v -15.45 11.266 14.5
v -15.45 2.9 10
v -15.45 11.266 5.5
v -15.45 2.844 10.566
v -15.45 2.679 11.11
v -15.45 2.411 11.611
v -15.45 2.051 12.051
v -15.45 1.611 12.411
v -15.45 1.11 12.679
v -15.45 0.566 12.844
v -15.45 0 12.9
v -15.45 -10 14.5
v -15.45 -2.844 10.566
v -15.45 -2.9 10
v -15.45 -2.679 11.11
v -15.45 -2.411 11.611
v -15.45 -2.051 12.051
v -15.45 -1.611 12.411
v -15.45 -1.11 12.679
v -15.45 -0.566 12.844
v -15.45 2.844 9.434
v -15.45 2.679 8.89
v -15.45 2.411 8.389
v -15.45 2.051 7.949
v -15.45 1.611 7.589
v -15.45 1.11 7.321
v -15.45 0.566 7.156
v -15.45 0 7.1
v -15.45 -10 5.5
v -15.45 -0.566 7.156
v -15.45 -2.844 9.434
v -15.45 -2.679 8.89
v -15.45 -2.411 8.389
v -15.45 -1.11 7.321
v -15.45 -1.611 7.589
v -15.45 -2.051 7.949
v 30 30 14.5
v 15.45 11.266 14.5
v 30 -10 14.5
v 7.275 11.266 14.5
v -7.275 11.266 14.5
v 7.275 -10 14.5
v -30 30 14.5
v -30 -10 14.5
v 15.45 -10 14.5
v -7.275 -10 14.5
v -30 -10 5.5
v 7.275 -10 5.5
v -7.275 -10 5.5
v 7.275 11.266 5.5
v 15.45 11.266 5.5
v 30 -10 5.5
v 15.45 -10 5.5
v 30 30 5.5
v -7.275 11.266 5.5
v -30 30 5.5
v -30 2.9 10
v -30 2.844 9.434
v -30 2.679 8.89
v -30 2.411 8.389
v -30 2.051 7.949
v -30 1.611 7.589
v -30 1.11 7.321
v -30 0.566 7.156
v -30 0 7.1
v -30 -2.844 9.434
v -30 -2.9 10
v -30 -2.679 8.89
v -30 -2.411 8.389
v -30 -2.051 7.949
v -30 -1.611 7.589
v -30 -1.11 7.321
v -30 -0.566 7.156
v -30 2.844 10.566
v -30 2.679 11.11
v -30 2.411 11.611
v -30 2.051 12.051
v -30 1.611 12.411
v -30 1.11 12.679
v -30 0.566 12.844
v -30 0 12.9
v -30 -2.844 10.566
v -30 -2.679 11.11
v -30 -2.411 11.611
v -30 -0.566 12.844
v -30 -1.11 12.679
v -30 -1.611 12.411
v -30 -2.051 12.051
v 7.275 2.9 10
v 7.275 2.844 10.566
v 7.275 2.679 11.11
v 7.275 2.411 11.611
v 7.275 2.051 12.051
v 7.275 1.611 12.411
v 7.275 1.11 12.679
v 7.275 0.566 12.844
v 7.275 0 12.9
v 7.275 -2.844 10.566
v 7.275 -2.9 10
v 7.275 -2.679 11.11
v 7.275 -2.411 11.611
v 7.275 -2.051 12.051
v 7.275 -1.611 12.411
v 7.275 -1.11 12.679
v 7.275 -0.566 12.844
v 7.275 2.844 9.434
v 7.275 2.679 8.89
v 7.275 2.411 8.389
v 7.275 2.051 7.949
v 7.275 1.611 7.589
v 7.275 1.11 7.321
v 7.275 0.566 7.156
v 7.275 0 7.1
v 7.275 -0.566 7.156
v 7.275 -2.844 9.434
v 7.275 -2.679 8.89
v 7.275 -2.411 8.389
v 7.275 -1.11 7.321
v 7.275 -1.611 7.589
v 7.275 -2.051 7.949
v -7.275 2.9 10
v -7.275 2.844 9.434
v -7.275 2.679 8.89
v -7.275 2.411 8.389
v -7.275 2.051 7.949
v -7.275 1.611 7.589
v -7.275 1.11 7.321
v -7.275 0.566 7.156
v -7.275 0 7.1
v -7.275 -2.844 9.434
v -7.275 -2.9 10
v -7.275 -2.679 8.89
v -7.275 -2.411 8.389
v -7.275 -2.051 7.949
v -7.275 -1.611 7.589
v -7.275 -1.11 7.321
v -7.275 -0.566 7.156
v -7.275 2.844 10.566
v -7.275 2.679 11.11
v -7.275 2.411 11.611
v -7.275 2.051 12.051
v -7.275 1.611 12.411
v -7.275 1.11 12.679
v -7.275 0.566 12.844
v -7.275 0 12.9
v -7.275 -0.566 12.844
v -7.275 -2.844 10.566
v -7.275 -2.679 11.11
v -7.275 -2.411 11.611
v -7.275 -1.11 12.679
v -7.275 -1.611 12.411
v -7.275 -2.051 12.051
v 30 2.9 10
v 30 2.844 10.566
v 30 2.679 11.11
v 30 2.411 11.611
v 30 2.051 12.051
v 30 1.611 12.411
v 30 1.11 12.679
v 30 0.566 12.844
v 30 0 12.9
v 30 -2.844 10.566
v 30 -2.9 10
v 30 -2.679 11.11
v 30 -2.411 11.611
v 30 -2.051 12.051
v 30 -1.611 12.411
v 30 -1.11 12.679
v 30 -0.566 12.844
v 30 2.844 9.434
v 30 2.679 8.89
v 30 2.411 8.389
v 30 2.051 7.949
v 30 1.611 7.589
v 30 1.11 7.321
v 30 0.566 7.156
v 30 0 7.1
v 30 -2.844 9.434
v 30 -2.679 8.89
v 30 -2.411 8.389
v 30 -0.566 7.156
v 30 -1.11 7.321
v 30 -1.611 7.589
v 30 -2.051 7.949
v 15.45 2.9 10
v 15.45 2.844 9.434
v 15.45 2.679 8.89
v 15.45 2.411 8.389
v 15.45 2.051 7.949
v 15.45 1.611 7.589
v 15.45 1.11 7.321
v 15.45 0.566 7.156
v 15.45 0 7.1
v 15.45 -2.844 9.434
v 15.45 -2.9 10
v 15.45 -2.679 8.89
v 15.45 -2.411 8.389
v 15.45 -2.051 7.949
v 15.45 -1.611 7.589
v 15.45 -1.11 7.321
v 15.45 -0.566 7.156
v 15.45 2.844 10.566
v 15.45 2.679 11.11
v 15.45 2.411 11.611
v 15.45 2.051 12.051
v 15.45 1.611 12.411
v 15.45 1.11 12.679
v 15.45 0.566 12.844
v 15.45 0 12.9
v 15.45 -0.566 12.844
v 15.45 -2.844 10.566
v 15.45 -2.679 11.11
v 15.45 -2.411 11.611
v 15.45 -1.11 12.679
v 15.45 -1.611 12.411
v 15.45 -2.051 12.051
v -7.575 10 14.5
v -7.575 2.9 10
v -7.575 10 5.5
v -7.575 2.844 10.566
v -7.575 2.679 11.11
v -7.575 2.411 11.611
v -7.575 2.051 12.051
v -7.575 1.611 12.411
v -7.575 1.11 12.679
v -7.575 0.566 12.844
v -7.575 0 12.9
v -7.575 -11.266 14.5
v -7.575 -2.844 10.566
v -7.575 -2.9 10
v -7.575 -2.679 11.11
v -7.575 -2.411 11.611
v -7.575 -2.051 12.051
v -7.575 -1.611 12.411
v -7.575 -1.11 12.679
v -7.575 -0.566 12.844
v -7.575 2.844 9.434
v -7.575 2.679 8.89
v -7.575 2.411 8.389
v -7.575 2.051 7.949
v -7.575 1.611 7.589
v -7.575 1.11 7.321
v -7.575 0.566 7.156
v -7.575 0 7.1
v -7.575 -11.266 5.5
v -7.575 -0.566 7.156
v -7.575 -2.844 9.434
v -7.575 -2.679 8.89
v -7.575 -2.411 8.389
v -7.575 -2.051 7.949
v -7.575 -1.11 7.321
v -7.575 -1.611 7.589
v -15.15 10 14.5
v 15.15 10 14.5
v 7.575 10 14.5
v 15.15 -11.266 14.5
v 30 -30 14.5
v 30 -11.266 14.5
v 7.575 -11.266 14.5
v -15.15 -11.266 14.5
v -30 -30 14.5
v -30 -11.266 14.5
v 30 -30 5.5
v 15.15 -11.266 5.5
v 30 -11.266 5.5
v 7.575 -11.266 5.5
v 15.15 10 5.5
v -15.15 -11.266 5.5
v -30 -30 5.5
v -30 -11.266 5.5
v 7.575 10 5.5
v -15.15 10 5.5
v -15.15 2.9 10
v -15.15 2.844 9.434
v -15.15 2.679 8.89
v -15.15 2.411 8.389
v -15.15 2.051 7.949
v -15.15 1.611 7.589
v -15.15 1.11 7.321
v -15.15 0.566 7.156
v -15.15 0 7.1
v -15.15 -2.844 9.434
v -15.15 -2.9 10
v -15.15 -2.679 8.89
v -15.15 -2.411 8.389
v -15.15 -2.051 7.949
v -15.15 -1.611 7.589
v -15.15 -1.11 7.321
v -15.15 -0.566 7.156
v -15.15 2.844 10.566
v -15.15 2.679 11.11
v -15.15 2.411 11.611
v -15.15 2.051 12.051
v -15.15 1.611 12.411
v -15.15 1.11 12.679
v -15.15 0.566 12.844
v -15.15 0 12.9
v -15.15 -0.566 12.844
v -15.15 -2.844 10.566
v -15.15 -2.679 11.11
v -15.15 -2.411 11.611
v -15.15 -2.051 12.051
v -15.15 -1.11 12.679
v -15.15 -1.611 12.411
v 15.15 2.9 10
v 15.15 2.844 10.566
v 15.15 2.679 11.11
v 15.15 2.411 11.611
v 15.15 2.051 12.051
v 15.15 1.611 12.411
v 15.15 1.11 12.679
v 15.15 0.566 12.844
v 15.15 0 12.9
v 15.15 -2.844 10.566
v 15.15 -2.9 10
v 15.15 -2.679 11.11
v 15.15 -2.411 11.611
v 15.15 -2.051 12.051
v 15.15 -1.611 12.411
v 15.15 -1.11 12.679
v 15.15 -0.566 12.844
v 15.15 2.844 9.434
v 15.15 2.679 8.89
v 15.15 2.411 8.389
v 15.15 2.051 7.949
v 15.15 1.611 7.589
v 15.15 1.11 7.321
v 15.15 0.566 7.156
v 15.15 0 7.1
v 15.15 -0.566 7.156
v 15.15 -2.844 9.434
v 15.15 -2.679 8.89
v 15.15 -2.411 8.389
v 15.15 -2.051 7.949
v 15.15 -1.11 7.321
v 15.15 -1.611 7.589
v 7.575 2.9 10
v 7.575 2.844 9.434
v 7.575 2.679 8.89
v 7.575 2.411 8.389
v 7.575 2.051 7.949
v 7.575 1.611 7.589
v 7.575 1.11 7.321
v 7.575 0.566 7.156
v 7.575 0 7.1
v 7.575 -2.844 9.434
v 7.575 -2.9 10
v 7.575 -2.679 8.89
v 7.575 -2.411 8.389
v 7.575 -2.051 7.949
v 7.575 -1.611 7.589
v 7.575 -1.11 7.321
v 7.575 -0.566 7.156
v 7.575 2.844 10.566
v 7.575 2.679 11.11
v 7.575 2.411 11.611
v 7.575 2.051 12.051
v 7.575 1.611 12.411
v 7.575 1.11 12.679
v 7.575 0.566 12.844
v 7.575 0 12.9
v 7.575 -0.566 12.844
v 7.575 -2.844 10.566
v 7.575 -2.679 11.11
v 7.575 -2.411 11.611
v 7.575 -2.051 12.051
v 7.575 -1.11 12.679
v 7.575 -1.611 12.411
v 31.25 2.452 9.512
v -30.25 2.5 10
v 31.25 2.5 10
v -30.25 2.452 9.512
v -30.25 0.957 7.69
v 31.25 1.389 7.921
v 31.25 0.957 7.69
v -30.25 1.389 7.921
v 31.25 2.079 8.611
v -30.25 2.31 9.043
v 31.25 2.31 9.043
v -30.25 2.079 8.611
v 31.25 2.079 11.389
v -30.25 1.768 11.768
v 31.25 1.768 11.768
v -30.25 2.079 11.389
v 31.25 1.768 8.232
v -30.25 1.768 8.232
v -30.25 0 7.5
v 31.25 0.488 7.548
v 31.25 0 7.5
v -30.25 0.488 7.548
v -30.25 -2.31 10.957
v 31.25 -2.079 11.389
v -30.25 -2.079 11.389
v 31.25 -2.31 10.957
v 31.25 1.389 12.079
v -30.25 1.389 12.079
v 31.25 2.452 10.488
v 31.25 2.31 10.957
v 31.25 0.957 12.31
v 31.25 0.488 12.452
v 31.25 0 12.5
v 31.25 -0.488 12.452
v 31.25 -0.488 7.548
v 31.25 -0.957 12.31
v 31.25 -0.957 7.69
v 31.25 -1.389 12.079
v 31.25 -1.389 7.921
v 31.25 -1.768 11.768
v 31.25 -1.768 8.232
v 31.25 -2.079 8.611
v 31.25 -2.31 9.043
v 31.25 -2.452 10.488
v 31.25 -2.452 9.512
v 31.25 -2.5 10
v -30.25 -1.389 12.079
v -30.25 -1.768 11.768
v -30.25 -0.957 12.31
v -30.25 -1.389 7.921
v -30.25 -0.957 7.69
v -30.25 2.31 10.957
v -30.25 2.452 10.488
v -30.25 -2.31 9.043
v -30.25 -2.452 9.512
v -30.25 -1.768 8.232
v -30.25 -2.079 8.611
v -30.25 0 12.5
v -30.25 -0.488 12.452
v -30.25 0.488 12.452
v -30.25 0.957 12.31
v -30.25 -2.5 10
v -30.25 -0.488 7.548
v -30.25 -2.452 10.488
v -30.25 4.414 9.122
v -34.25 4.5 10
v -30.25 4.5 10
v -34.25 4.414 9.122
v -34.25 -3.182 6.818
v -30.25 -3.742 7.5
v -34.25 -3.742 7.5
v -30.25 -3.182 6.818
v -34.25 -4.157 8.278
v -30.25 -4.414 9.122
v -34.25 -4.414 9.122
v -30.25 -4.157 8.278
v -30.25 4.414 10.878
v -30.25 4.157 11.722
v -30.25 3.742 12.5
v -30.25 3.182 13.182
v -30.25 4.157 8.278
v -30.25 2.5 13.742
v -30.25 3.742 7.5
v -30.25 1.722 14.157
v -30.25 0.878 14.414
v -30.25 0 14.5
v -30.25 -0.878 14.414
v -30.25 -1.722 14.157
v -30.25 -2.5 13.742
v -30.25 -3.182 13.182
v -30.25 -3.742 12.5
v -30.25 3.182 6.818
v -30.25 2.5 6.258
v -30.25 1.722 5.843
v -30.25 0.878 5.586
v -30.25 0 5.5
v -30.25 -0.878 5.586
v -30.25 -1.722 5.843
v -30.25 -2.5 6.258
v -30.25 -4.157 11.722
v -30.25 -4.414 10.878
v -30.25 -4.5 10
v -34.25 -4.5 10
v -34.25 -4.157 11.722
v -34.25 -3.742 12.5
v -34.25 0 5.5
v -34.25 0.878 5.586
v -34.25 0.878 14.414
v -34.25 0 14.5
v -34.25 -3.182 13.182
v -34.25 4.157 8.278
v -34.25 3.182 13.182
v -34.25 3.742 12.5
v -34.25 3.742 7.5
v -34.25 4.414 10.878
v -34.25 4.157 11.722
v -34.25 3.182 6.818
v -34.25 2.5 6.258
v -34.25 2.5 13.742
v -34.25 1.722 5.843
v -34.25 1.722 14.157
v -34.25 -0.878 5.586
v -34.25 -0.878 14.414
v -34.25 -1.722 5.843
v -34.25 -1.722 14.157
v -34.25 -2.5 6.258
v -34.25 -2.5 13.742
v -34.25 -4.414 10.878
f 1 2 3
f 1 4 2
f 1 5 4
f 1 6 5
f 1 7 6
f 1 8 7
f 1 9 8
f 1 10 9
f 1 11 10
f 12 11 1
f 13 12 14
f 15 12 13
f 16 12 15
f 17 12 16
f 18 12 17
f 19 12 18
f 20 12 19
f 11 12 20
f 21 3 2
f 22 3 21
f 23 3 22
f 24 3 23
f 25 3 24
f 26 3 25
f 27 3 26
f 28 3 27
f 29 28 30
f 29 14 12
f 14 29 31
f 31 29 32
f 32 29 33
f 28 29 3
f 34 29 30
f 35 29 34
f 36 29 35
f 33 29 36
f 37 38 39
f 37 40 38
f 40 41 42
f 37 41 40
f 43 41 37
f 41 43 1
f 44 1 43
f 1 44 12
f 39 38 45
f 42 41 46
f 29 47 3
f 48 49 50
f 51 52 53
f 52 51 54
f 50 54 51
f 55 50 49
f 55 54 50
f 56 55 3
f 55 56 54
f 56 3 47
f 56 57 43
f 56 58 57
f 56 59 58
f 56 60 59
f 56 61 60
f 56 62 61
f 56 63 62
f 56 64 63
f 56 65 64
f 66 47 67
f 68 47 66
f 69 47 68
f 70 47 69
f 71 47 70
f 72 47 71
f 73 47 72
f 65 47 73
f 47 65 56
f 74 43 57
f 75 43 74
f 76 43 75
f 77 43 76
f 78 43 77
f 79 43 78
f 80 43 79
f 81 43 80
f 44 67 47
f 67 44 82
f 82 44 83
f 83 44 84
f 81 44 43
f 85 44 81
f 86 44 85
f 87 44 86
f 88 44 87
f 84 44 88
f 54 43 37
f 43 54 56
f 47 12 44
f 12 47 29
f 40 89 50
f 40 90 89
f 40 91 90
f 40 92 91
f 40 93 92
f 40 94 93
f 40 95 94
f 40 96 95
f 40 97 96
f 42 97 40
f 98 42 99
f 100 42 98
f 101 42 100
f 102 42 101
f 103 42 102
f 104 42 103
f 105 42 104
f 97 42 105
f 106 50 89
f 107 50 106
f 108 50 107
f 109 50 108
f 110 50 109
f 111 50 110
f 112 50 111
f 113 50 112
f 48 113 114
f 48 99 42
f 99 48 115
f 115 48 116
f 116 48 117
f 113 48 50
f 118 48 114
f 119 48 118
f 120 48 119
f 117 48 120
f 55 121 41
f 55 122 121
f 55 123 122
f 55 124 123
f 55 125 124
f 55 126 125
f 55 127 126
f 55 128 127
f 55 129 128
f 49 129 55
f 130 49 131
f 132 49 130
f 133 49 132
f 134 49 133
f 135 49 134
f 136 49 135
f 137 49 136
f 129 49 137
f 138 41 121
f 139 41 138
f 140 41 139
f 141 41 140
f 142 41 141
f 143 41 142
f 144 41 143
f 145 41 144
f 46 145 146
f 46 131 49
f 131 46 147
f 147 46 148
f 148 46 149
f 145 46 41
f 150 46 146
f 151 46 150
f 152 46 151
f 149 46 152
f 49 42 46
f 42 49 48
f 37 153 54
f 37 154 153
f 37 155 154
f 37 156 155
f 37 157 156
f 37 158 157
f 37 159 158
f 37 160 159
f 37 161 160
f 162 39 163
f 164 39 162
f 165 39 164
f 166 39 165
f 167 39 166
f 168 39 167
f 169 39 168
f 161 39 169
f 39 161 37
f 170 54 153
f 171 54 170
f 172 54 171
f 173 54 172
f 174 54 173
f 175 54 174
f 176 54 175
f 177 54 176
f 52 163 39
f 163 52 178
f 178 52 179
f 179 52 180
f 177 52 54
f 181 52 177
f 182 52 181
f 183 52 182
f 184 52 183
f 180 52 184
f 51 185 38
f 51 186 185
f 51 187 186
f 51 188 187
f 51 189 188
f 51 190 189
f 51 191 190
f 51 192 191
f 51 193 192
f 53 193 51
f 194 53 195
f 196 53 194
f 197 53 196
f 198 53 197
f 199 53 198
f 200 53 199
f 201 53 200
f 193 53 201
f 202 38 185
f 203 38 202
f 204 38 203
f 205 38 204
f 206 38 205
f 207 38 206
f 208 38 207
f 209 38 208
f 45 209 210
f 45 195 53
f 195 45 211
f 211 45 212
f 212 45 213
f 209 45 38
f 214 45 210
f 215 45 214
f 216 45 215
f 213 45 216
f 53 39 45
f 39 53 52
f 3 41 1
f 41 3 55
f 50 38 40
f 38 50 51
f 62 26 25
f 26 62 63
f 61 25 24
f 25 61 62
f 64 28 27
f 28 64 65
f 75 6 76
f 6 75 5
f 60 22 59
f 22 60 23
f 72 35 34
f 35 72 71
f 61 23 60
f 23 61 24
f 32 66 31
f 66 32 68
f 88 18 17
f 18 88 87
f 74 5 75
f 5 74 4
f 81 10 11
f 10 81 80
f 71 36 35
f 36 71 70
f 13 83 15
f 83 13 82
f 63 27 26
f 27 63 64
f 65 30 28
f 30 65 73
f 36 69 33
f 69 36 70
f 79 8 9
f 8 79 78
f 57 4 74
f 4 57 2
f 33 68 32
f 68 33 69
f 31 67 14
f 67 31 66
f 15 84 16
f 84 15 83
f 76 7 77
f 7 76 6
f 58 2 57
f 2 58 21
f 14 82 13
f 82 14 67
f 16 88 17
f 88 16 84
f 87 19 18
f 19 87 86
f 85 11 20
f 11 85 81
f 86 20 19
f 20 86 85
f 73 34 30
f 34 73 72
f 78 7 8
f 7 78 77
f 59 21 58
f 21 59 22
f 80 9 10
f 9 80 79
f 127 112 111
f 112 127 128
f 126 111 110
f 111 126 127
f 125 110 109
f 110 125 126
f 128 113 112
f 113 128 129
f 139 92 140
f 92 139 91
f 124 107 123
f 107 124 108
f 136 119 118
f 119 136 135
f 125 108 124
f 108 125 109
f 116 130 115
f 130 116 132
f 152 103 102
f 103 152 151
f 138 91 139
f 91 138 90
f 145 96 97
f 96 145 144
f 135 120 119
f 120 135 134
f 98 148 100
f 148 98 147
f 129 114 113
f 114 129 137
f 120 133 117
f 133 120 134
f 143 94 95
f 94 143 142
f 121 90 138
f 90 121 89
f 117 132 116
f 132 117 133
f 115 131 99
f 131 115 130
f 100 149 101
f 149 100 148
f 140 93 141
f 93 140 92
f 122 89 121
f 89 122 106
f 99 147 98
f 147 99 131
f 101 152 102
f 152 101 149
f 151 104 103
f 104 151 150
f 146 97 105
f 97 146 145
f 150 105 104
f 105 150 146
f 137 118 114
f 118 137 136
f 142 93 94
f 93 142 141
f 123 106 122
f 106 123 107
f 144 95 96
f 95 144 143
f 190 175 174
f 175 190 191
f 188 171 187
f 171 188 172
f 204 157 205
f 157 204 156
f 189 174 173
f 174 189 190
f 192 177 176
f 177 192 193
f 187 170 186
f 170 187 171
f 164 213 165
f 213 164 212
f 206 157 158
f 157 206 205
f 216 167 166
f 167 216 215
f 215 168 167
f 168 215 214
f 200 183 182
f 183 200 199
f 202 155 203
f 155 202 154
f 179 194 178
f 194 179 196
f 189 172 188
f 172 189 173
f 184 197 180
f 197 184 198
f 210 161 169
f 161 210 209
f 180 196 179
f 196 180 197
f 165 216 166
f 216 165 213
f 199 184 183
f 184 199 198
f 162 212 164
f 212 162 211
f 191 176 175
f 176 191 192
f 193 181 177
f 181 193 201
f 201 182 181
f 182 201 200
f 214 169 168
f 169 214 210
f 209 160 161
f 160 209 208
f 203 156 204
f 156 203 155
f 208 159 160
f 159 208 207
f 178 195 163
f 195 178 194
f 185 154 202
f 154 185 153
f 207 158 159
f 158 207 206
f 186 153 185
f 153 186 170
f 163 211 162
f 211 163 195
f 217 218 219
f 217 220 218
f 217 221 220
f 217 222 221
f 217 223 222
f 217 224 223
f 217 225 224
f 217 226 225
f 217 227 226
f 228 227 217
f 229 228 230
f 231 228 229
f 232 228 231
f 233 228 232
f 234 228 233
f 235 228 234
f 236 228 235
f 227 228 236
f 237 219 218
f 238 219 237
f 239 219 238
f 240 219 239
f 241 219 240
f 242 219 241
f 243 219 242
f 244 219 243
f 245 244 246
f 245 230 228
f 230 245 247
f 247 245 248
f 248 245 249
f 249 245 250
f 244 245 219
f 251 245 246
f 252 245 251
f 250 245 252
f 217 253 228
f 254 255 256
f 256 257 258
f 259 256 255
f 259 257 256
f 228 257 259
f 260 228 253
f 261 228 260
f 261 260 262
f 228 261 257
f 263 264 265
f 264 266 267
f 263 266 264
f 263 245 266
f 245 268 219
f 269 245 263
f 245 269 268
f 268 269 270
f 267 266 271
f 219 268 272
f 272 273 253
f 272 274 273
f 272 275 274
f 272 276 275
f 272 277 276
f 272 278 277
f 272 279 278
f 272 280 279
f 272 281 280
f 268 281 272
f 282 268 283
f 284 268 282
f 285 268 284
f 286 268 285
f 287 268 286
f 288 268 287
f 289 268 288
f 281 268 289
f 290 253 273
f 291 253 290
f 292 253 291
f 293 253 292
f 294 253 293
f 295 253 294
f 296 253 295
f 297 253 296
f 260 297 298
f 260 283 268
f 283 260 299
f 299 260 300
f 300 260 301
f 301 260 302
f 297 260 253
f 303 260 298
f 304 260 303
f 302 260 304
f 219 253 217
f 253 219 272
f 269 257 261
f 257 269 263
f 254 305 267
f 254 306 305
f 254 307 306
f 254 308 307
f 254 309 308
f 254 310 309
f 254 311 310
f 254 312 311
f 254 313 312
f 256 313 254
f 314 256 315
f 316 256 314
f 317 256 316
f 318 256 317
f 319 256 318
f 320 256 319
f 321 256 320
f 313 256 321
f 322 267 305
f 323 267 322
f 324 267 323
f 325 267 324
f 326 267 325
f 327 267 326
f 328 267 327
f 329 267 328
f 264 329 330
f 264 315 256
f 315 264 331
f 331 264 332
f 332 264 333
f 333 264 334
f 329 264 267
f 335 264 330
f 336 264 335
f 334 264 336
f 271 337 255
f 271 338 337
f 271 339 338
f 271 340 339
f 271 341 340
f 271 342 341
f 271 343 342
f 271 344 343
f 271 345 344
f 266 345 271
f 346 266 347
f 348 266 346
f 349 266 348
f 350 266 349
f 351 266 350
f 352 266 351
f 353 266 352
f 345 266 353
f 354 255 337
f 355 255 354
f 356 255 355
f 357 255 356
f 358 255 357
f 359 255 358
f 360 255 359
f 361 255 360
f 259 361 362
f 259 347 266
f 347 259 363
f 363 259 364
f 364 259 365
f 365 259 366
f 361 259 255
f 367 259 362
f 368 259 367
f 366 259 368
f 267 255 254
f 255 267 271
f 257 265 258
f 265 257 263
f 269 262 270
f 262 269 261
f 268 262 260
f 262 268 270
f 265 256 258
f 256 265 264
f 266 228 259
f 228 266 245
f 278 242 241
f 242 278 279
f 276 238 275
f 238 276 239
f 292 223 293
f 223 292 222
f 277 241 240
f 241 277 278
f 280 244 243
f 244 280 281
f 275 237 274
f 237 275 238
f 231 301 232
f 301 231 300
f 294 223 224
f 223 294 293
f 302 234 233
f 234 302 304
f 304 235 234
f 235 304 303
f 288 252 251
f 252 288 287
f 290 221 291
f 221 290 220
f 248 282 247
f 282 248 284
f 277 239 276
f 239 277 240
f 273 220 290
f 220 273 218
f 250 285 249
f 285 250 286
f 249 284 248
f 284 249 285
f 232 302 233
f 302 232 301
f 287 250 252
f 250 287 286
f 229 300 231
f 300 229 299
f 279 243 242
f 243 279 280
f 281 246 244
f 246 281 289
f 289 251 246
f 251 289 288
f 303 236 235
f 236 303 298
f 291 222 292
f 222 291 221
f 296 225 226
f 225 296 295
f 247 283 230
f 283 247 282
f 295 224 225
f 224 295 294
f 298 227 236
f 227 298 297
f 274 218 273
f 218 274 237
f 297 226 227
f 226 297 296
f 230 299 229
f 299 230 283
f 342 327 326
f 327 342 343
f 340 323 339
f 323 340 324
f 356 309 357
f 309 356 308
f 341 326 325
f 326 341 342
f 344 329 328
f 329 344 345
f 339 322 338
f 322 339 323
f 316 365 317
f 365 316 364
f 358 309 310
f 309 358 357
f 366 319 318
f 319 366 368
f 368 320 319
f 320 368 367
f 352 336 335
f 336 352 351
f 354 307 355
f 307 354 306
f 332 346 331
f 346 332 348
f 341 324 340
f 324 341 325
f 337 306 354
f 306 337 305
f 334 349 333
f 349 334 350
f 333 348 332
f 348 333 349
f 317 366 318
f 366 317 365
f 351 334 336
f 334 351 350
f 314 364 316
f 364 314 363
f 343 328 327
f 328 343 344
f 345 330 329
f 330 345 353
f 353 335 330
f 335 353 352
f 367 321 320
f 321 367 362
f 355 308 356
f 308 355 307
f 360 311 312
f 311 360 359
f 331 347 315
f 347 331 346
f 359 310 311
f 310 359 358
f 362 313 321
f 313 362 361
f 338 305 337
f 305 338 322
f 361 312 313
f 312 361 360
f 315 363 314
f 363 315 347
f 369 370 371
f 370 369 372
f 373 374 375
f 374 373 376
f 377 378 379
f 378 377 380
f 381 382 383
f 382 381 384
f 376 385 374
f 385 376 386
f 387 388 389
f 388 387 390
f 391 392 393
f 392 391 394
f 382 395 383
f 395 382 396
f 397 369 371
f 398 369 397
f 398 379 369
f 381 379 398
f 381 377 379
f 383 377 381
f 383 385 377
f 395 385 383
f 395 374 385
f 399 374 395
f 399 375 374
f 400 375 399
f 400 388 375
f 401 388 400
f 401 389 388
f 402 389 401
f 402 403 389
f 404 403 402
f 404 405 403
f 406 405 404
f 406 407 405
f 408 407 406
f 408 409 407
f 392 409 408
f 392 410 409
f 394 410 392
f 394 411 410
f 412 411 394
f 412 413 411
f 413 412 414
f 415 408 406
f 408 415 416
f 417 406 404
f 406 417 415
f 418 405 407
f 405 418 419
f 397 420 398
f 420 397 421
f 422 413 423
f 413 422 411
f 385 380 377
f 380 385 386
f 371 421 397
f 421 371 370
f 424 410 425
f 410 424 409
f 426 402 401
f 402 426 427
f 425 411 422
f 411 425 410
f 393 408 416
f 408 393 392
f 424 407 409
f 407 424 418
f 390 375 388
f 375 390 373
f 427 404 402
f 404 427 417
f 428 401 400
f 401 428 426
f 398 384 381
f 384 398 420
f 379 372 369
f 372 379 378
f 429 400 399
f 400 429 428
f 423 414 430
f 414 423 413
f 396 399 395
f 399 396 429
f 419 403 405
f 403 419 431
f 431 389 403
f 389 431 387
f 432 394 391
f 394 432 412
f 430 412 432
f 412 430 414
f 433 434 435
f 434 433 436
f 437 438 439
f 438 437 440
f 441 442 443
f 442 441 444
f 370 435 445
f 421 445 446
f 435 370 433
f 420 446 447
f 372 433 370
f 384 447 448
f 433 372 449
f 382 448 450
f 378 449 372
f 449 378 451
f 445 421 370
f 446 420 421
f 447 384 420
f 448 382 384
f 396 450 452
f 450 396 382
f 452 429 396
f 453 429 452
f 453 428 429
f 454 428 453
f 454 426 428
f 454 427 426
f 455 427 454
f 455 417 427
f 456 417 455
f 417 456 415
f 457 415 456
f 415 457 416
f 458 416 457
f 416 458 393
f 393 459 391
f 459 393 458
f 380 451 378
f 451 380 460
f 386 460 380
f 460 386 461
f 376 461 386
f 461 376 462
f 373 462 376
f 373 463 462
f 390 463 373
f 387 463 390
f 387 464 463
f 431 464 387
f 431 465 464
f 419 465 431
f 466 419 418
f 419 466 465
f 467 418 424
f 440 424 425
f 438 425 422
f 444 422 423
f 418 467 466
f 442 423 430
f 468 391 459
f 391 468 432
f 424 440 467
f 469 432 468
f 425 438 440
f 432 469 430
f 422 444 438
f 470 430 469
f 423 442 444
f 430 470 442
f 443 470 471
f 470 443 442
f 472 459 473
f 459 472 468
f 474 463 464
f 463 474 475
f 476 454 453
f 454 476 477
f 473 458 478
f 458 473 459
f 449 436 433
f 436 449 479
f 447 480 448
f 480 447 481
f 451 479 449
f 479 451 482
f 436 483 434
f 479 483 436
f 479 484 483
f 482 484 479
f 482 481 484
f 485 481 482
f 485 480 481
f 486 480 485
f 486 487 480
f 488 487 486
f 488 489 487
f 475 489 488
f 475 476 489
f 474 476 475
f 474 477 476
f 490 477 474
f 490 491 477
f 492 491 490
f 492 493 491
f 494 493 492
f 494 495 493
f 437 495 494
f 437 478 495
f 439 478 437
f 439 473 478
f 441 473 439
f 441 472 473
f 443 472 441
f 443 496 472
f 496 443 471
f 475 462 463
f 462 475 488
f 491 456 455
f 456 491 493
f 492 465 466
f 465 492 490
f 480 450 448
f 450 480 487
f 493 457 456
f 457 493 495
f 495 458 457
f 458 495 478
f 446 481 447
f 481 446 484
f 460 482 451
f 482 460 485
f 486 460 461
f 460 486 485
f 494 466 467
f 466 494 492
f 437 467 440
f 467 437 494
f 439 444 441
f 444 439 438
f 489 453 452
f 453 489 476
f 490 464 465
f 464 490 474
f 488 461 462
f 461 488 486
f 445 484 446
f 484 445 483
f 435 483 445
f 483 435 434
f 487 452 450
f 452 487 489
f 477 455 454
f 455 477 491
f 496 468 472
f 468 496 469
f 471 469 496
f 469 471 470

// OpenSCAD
$fn = 32;

// ------------------------------------------------------------------------
// Butt hinge: hinge 60 mm, leaf swung 0 deg
// Every part is its own module, assembly() places every instance.
// ------------------------------------------------------------------------

// --- part 1 ---
module hinge_base() {
  difference() {
    union() {
      translate([-30, -10, -4.5]) cube([14.55, 40, 9]);
      translate([-7.275, -10, -4.5]) cube([14.55, 40, 9]);
      translate([15.45, -10, -4.5]) cube([14.55, 40, 9]);
      translate([-30, 11.266, -4.5]) cube([60, 18.734, 9]);
    }
    translate([-22.725, 0, 0]) rotate([0, 90, 0]) cylinder(h = 16.55, d = 5.8, center = true);
    translate([0, 0, 0]) rotate([0, 90, 0]) cylinder(h = 16.55, d = 5.8, center = true);
    translate([22.725, 0, 0]) rotate([0, 90, 0]) cylinder(h = 16.55, d = 5.8, center = true);
  }
}

// --- part 2 ---
module hinge_mover() {
  difference() {
    union() {
      translate([-15.15, -30, -4.5]) cube([7.575, 40, 9]);
      translate([7.575, -30, -4.5]) cube([7.575, 40, 9]);
      translate([-30, -30, -4.5]) cube([60, 18.734, 9]);
    }
    translate([-11.362, 0, 0]) rotate([0, 90, 0]) cylinder(h = 9.575, d = 5.8, center = true);
    translate([11.362, 0, 0]) rotate([0, 90, 0]) cylinder(h = 9.575, d = 5.8, center = true);
  }
}

// --- part 3 ---
module hinge_pin() {
  rotate([0, 90, 0]) cylinder(h = 62.5, d = 5, center = true);
  translate([-34.25, 0, 0]) rotate([0, 90, 0]) cylinder(h = 4, d = 9);
}

// --- assembly ---
module assembly() {
  color([0.80, 0.24, 0.20]) translate([0, 0, 10]) rotate([0, 0, 0]) hinge_base();
  color([0.20, 0.45, 0.75]) translate([0, 0, 10]) rotate([0, 0, 0]) hinge_mover();
  color([0.25, 0.62, 0.32]) translate([0, 0, 10]) rotate([0, 0, 0]) hinge_pin();
}

assembly();
